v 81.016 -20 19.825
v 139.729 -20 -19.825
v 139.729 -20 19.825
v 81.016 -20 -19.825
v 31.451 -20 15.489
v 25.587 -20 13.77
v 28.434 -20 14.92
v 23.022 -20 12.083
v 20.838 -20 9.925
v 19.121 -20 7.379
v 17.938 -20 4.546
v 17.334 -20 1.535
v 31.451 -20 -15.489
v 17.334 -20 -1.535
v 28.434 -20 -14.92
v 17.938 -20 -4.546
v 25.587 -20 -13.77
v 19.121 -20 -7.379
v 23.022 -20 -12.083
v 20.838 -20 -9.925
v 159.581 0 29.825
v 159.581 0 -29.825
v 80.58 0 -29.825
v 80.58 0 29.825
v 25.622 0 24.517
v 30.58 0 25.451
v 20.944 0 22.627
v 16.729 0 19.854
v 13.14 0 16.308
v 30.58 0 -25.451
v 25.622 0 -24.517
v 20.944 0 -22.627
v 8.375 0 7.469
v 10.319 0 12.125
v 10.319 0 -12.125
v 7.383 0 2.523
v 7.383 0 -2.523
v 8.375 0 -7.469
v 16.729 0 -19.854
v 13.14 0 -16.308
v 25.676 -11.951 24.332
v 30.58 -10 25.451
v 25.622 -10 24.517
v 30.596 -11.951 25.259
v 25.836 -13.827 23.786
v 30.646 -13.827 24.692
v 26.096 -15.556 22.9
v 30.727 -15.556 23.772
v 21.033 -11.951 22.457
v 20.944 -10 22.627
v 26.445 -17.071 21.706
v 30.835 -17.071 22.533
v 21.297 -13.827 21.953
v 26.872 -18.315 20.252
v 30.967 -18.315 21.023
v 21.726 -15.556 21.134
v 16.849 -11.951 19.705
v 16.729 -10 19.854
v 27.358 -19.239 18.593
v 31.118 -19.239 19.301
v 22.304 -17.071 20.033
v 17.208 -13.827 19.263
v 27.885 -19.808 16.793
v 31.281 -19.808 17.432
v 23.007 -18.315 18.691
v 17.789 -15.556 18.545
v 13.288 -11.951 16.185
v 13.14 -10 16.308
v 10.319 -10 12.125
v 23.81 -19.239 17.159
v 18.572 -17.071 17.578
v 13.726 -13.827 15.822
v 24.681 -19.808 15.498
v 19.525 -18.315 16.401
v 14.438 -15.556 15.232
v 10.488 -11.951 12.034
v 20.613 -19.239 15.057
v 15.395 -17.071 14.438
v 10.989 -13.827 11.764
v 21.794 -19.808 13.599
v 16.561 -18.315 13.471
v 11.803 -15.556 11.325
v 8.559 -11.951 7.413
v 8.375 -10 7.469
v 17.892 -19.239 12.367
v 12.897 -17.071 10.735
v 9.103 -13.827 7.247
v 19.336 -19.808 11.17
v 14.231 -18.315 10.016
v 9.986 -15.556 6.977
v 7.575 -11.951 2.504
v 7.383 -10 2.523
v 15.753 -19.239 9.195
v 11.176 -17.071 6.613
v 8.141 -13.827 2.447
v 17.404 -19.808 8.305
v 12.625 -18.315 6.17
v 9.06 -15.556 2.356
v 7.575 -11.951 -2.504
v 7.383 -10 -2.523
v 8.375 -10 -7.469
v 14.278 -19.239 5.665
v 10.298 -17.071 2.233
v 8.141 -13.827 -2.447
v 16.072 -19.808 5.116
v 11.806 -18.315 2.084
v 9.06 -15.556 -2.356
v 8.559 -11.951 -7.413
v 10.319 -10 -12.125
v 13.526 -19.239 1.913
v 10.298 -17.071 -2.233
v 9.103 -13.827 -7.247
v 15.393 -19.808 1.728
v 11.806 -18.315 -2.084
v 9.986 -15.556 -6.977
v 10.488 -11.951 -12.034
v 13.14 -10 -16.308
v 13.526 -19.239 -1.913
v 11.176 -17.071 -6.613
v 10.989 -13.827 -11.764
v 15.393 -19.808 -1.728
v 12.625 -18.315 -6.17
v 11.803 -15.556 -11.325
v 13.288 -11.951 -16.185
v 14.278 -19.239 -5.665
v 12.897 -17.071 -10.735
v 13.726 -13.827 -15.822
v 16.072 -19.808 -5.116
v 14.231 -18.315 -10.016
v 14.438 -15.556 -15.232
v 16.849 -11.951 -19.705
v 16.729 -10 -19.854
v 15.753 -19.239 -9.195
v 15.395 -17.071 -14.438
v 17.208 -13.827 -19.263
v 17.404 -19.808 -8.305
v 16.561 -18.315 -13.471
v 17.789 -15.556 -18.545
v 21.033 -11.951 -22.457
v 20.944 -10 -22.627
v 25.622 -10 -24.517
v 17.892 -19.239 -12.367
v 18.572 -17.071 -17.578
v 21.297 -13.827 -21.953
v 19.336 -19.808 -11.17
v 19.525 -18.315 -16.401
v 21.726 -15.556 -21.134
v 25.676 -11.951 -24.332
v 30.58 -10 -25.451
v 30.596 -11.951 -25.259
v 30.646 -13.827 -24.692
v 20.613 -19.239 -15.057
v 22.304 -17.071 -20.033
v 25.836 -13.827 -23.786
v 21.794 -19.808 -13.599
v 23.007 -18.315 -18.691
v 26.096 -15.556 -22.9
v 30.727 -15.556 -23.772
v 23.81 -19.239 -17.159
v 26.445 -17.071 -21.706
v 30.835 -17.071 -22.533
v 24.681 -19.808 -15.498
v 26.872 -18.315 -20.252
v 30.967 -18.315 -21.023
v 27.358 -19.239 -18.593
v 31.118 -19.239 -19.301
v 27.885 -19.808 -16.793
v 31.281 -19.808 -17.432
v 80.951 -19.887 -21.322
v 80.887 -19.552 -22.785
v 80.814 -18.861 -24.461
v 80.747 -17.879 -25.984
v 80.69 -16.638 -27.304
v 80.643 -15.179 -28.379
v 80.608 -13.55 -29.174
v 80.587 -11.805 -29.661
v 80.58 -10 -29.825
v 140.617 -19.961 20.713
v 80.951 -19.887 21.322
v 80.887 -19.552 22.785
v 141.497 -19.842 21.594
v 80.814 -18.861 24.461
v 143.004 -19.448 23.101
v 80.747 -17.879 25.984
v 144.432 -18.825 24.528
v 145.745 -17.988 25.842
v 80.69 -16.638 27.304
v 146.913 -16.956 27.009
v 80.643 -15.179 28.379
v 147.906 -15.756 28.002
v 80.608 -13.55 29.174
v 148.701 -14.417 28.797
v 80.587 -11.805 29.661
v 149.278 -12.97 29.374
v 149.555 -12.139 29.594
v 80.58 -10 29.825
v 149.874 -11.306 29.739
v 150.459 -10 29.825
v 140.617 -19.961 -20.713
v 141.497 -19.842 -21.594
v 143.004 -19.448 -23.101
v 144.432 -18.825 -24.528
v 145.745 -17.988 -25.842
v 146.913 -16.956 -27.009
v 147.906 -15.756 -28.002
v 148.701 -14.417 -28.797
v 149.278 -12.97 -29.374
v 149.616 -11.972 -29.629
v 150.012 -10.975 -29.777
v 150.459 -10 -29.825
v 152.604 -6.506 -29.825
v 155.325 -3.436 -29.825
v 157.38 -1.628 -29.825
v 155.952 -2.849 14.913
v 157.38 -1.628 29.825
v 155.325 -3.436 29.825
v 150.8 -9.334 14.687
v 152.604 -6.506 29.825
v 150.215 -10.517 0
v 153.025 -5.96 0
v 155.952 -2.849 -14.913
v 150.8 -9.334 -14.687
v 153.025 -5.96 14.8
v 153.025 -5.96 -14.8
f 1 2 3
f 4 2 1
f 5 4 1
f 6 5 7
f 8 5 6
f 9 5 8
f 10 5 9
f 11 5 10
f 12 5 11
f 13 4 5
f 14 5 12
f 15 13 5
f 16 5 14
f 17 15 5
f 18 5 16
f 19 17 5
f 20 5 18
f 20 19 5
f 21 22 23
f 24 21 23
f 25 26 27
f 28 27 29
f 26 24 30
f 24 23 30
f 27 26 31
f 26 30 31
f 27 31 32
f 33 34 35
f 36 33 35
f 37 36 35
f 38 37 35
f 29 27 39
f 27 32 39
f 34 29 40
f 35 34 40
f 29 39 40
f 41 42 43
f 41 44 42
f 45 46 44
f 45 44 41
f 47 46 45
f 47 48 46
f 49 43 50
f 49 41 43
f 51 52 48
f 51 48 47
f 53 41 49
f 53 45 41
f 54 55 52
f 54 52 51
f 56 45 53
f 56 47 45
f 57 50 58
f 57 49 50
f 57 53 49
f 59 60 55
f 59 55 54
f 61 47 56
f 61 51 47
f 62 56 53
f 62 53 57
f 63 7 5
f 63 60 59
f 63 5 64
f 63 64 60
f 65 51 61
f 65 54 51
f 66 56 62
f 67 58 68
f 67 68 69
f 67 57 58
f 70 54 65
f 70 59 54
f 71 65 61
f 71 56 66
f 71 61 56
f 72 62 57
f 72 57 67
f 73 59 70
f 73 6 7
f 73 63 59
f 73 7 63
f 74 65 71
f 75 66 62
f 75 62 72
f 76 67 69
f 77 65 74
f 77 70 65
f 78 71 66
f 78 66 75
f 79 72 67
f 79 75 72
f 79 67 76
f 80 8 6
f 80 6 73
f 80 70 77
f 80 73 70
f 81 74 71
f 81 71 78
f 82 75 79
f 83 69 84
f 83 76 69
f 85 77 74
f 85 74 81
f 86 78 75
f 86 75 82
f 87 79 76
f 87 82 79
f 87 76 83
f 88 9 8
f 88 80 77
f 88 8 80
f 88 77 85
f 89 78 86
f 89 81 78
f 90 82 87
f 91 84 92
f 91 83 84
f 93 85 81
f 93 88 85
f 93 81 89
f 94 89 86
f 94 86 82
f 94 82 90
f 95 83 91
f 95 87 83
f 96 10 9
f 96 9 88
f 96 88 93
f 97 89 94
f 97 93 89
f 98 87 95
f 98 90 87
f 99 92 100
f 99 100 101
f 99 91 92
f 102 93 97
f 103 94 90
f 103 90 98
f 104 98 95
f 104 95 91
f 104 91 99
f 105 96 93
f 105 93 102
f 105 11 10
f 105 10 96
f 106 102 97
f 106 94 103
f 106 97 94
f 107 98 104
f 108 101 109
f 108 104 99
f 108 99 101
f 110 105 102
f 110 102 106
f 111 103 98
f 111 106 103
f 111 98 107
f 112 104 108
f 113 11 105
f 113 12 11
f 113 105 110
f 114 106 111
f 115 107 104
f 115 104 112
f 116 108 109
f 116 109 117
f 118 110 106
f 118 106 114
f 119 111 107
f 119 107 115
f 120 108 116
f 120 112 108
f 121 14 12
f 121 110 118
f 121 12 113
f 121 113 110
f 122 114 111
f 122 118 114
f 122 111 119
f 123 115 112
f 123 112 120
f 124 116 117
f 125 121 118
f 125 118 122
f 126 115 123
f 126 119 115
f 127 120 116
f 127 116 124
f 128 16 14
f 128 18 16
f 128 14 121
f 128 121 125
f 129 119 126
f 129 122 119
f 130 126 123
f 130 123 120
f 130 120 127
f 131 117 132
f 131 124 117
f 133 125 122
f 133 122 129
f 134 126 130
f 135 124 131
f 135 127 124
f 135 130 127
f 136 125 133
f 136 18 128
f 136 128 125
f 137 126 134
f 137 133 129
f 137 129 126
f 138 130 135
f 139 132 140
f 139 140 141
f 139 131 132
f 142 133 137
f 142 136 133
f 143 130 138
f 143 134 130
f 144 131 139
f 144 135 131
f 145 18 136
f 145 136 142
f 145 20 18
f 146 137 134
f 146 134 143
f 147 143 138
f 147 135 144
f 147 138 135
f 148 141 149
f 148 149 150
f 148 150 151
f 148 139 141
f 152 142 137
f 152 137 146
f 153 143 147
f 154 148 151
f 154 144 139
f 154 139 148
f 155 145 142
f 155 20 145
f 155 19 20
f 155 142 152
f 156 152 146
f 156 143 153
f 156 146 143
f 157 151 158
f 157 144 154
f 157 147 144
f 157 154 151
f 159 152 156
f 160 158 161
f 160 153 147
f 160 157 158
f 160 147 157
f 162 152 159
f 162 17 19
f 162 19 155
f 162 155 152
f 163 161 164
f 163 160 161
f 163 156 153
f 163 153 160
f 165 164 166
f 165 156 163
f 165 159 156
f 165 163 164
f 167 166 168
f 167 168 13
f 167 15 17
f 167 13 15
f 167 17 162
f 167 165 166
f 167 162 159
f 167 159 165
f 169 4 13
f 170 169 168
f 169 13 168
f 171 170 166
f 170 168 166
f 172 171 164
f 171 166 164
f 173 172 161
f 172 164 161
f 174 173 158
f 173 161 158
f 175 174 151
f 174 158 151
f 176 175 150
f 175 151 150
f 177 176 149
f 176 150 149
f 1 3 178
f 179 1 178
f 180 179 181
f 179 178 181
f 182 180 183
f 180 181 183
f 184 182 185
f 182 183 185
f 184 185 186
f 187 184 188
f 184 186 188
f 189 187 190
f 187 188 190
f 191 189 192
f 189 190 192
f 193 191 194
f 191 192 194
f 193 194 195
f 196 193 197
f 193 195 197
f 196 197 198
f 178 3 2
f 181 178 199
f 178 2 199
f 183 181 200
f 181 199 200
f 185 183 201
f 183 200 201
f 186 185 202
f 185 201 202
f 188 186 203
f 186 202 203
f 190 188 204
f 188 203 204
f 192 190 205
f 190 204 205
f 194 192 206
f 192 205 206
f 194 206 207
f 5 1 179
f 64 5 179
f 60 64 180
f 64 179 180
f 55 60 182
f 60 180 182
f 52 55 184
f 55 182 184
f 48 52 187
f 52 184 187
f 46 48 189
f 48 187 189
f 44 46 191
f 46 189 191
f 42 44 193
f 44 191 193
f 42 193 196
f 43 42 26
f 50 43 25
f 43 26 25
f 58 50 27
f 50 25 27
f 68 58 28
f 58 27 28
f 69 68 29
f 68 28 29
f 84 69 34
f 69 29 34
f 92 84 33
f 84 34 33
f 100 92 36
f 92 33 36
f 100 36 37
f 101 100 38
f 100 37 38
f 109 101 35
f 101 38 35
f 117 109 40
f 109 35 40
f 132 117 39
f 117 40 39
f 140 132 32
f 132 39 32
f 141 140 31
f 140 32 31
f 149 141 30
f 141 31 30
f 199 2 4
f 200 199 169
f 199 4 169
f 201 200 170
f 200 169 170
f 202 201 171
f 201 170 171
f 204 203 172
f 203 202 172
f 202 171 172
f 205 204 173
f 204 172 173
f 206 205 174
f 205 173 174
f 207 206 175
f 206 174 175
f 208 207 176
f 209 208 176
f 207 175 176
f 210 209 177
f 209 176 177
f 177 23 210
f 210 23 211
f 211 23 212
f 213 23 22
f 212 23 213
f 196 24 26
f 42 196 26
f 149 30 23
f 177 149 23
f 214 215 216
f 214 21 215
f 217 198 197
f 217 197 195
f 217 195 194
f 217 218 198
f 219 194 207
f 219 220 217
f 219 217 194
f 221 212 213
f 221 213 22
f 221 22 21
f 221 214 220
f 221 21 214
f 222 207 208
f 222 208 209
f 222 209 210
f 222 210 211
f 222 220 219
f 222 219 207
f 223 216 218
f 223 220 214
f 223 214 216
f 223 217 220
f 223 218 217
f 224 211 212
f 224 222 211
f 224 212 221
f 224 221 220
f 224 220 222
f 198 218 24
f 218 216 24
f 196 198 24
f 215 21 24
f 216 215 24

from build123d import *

# Parameters (mm, degrees)
EXTRUDE_1_DEPTH          = 20
CUT_EXTRUDE_1_DEPTH      = 168.622030081
CUT_EXTRUDE_1_DEPTH_BACK = 168.622030081
FILLET_1_R               = 10


with BuildPart() as part:
    # 草图3 → 凸台-拉伸1 (new body)
    with BuildSketch(Plane(origin=(0, 0, 0), x_dir=(1, 0, 0), z_dir=(0, 1, 0))):
        with BuildLine():
            Line((163.730296133, -29.825074964), (80.579718414, -29.825074964))
            Line((80.579718414, -29.825074964), (30.579718414, -25.450641788))
            ThreePointArc((30.579718414, -25.450641788), (7.258501946, 0), (30.579718414, 25.450641788))
            Line((30.579718414, 25.450641788), (80.579718414, 29.825074964))
            Line((80.579718414, 29.825074964), (163.730296133, 29.825074964))
            Line((163.730296133, 29.825074964), (163.730296133, -29.825074964))
        make_face()
    extrude(amount=-EXTRUDE_1_DEPTH)

    # 草图4 → 切除-拉伸1 (cut, two sides: drawn at the far end of the back side and taken through both)
    with BuildSketch(Plane.XY.offset(-CUT_EXTRUDE_1_DEPTH_BACK)):
        with BuildLine():
            Line((163.730296133, 0), (159.58071917, 0))
            add(Edge.make_bspline(
                [(159.58071917, 0), (148.122104631, -7.824360885), (148.302724928, -20)],
                knots=[0, 0, 0, 1, 1, 1], degree=2))
            Line((148.302724928, -20), (203.221653408, -20))
            Line((203.221653408, -20), (203.221653408, 0))
            Line((203.221653408, 0), (163.730296133, 0))
        make_face()
    extrude(amount=CUT_EXTRUDE_1_DEPTH + CUT_EXTRUDE_1_DEPTH_BACK, mode=Mode.SUBTRACT)

    # 圆角1
    # the kernel refuses this fillet: 10 mm, written as the material it takes off along each edge
    with BuildSketch(Plane(origin=(55.579718414, -20, -29.825074964), x_dir=(0, 0, 1), z_dir=(1, 0, 0))) as fillet_1_piece_1_section:
        with BuildLine():
            CenterArc((FILLET_1_R, -FILLET_1_R), FILLET_1_R, 90, 90)
            Line((0, -FILLET_1_R), (-FILLET_1_R * 0.02, -FILLET_1_R))
            Line((-FILLET_1_R * 0.02, -FILLET_1_R), (-FILLET_1_R * 0.02, FILLET_1_R * 0.02))
            Line((-FILLET_1_R * 0.02, FILLET_1_R * 0.02), (FILLET_1_R, FILLET_1_R * 0.02))
            Line((FILLET_1_R, FILLET_1_R * 0.02), (FILLET_1_R, 0))
        make_face()
    fillet_1_piece_1 = extrude(amount=117.723006514, mode=Mode.PRIVATE)
    fillet_1_piece_1 = split(fillet_1_piece_1, bisect_by=Plane(origin=(118.163125223, -17.857550266, -33.113196996), z_dir=(0.08715574274764791, 0, 0.9961946980917464)), keep=Keep.TOP, mode=Mode.PRIVATE)
    add(fillet_1_piece_1, mode=Mode.SUBTRACT)
    with BuildSketch(Plane(origin=(173.302724928, -20, 29.825074964), x_dir=(0, 1, 0), z_dir=(-1, 0, 0))) as fillet_1_piece_2_section:
        with BuildLine():
            CenterArc((FILLET_1_R, FILLET_1_R), FILLET_1_R, 180, 90)
            Line((0, FILLET_1_R), (-FILLET_1_R * 0.02, FILLET_1_R))
            Line((-FILLET_1_R * 0.02, FILLET_1_R), (-FILLET_1_R * 0.02, -FILLET_1_R * 0.02))
            Line((-FILLET_1_R * 0.02, -FILLET_1_R * 0.02), (FILLET_1_R, -FILLET_1_R * 0.02))
            Line((FILLET_1_R, -FILLET_1_R * 0.02), (FILLET_1_R, 0))
        make_face()
    fillet_1_piece_2 = extrude(amount=117.723006514, mode=Mode.PRIVATE)
    fillet_1_piece_2 = split(fillet_1_piece_2, bisect_by=Plane(origin=(118.163125223, -17.857550266, 33.113196996), z_dir=(0.08715574274764758, 0, -0.9961946980917465)), keep=Keep.TOP, mode=Mode.PRIVATE)
    add(fillet_1_piece_2, mode=Mode.SUBTRACT)
    with BuildSketch(Plane(origin=(105.484585867, -20, 32.003968533), x_dir=(0, 1, 0), z_dir=(-0.9961946980917465, 0, -0.08715574274764758))) as fillet_1_piece_3_section:
        with BuildLine():
            CenterArc((FILLET_1_R, FILLET_1_R), FILLET_1_R, 180, 90)
            Line((0, FILLET_1_R), (-FILLET_1_R * 0.02, FILLET_1_R))
            Line((-FILLET_1_R * 0.02, FILLET_1_R), (-FILLET_1_R * 0.02, -FILLET_1_R * 0.02))
            Line((-FILLET_1_R * 0.02, -FILLET_1_R * 0.02), (FILLET_1_R, -FILLET_1_R * 0.02))
            Line((FILLET_1_R, -FILLET_1_R * 0.02), (FILLET_1_R, 0))
        make_face()
    fillet_1_piece_3 = extrude(amount=75.190991877, mode=Mode.PRIVATE)
    fillet_1_piece_3 = split(fillet_1_piece_3, bisect_by=Plane(origin=(64.333848785, -17.936020538, 29.825074964), z_dir=(0, 0, -1)), keep=Keep.TOP, mode=Mode.PRIVATE)
    add(fillet_1_piece_3, mode=Mode.SUBTRACT)
    with BuildSketch(Plane(origin=(148.302724928, -20, 0), x_dir=(-1, 0, 0), z_dir=(0, 0, -1))) as fillet_1_piece_4:
        with BuildLine():
            CenterArc((8.573839583, 10), FILLET_1_R, 197.276402176, 72.723597824)
            Line((-0.974992369, 7.030183787), (-1.165969008, 6.970787462))
            ThreePointArc((-1.165969008, 6.970787462), (-0.405650645, 3.526203376), (-0.199977997, 0.002966586))
            Line((-0.199977997, 0.002966586), (0, -0.2))
            Line((0, -0.2), (8.573839583, -0.2))
            Line((8.573839583, -0.2), (8.573839583, 0))
        make_face()
    extrude(amount=29.825074964, mode=Mode.SUBTRACT)
    with BuildSketch(Plane(origin=(32.80636105, -20, 0), x_dir=(-0.08715574274764748, 0, 0.9961946980917464), z_dir=(0.9961946980917464, 0, 0.08715574274764748))) as fillet_1_piece_5:
        with BuildLine():
            CenterArc((25.547859105 - FILLET_1_R, -FILLET_1_R), FILLET_1_R, 0, 90)
            Line((25.547859105, -FILLET_1_R), (25.547859105 + FILLET_1_R * 0.02, -FILLET_1_R))
            Line((25.547859105 + FILLET_1_R * 0.02, -FILLET_1_R), (25.547859105 + FILLET_1_R * 0.02, FILLET_1_R * 0.02))
            Line((25.547859105 + FILLET_1_R * 0.02, FILLET_1_R * 0.02), (25.547859105 - FILLET_1_R, FILLET_1_R * 0.02))
            Line((25.547859105 - FILLET_1_R, FILLET_1_R * 0.02), (25.547859105 - FILLET_1_R, 0))
        make_face()
    revolve(axis=Axis((32.80636105, -20, 0), (0, -1, 0)), revolution_arc=170, mode=Mode.SUBTRACT)
    with BuildSketch(Plane(origin=(30.579718414, -20, -25.450641788), x_dir=(0.0871557427476479, 0, 0.9961946980917464), z_dir=(0.9961946980917464, 0, -0.08715574274764791))) as fillet_1_piece_6_section:
        with BuildLine():
            CenterArc((FILLET_1_R, -FILLET_1_R), FILLET_1_R, 90, 90)
            Line((0, -FILLET_1_R), (-FILLET_1_R * 0.02, -FILLET_1_R))
            Line((-FILLET_1_R * 0.02, -FILLET_1_R), (-FILLET_1_R * 0.02, FILLET_1_R * 0.02))
            Line((-FILLET_1_R * 0.02, FILLET_1_R * 0.02), (FILLET_1_R, FILLET_1_R * 0.02))
            Line((FILLET_1_R, FILLET_1_R * 0.02), (FILLET_1_R, 0))
        make_face()
    fillet_1_piece_6 = extrude(amount=75.190991877, mode=Mode.PRIVATE)
    fillet_1_piece_6 = split(fillet_1_piece_6, bisect_by=Plane(origin=(64.333848785, -17.936020538, -29.825074964), z_dir=(0, 0, 1)), keep=Keep.TOP, mode=Mode.PRIVATE)
    add(fillet_1_piece_6, mode=Mode.SUBTRACT)
    with BuildSketch(Plane(origin=(148.302724928, -20, 0), x_dir=(-1, 0, 0), z_dir=(0, 0, 1))) as fillet_1_piece_7:
        with BuildLine():
            CenterArc((8.573839583, -10), FILLET_1_R, 90, 72.723597824)
            Line((-0.974992369, -7.030183787), (-1.165969008, -6.970787462))
            ThreePointArc((-1.165969008, -6.970787462), (-0.405650645, -3.526203376), (-0.199977997, -0.002966586))
            Line((-0.199977997, -0.002966586), (0, 0.2))
            Line((0, 0.2), (8.573839583, 0.2))
            Line((8.573839583, 0.2), (8.573839583, 0))
        make_face()
    extrude(amount=29.825074964, mode=Mode.SUBTRACT)
    with BuildSketch(Plane(origin=(55.579718414, -20, -29.825074964), x_dir=(0, 0, 1), z_dir=(1, 0, 0))) as fillet_1_piece_8a_section:
        with BuildLine():
            CenterArc((FILLET_1_R, -FILLET_1_R), FILLET_1_R, 90, 90)
            Line((0, -FILLET_1_R), (-FILLET_1_R * 0.02, -FILLET_1_R))
            Line((-FILLET_1_R * 0.02, -FILLET_1_R), (-FILLET_1_R * 0.02, FILLET_1_R * 0.02))
            Line((-FILLET_1_R * 0.02, FILLET_1_R * 0.02), (FILLET_1_R, FILLET_1_R * 0.02))
            Line((FILLET_1_R, FILLET_1_R * 0.02), (FILLET_1_R, 0))
        make_face()
    fillet_1_piece_8a = extrude(amount=117.723006514, mode=Mode.PRIVATE)
    fillet_1_piece_8a = split(fillet_1_piece_8a, bisect_by=Plane(origin=(65.506587176, -16.325384108, -28.506346857), z_dir=(-0.08715574274764791, 0, -0.9961946980917464)), keep=Keep.TOP, mode=Mode.PRIVATE)
    with BuildSketch(Plane(origin=(30.579718414, -20, -25.450641788), x_dir=(0.0871557427476479, 0, 0.9961946980917464), z_dir=(0.9961946980917464, 0, -0.08715574274764791))) as fillet_1_piece_8b_section:
        with BuildLine():
            CenterArc((FILLET_1_R, -FILLET_1_R), FILLET_1_R, 90, 90)
            Line((0, -FILLET_1_R), (-FILLET_1_R * 0.02, -FILLET_1_R))
            Line((-FILLET_1_R * 0.02, -FILLET_1_R), (-FILLET_1_R * 0.02, FILLET_1_R * 0.02))
            Line((-FILLET_1_R * 0.02, FILLET_1_R * 0.02), (FILLET_1_R, FILLET_1_R * 0.02))
            Line((FILLET_1_R, FILLET_1_R * 0.02), (FILLET_1_R, 0))
        make_face()
    fillet_1_piece_8b = extrude(amount=75.190991877, mode=Mode.PRIVATE)
    fillet_1_piece_8b = split(fillet_1_piece_8b, bisect_by=Plane(origin=(95.710426565, -16.325384108, -29.825074964), z_dir=(0, 0, -1)), keep=Keep.TOP, mode=Mode.PRIVATE)
    fillet_1_piece_8 = fillet_1_piece_8a & fillet_1_piece_8b
    add(fillet_1_piece_8, mode=Mode.SUBTRACT)
    with BuildSketch(Plane(origin=(173.302724928, -20, 29.825074964), x_dir=(0, 1, 0), z_dir=(-1, 0, 0))) as fillet_1_piece_9a_section:
        with BuildLine():
            CenterArc((FILLET_1_R, FILLET_1_R), FILLET_1_R, 180, 90)
            Line((0, FILLET_1_R), (-FILLET_1_R * 0.02, FILLET_1_R))
            Line((-FILLET_1_R * 0.02, FILLET_1_R), (-FILLET_1_R * 0.02, -FILLET_1_R * 0.02))
            Line((-FILLET_1_R * 0.02, -FILLET_1_R * 0.02), (FILLET_1_R, -FILLET_1_R * 0.02))
            Line((FILLET_1_R, -FILLET_1_R * 0.02), (FILLET_1_R, 0))
        make_face()
    fillet_1_piece_9a = extrude(amount=117.723006514, mode=Mode.PRIVATE)
    fillet_1_piece_9a = split(fillet_1_piece_9a, bisect_by=Plane(origin=(65.506587176, -16.325384108, 28.506346857), z_dir=(-0.08715574274764758, 0, 0.9961946980917465)), keep=Keep.TOP, mode=Mode.PRIVATE)
    with BuildSketch(Plane(origin=(105.484585867, -20, 32.003968533), x_dir=(0, 1, 0), z_dir=(-0.9961946980917465, 0, -0.08715574274764758))) as fillet_1_piece_9b_section:
        with BuildLine():
            CenterArc((FILLET_1_R, FILLET_1_R), FILLET_1_R, 180, 90)
            Line((0, FILLET_1_R), (-FILLET_1_R * 0.02, FILLET_1_R))
            Line((-FILLET_1_R * 0.02, FILLET_1_R), (-FILLET_1_R * 0.02, -FILLET_1_R * 0.02))
            Line((-FILLET_1_R * 0.02, -FILLET_1_R * 0.02), (FILLET_1_R, -FILLET_1_R * 0.02))
            Line((FILLET_1_R, -FILLET_1_R * 0.02), (FILLET_1_R, 0))
        make_face()
    fillet_1_piece_9b = extrude(amount=75.190991877, mode=Mode.PRIVATE)
    fillet_1_piece_9b = split(fillet_1_piece_9b, bisect_by=Plane(origin=(95.710426565, -16.325384108, 29.825074964), z_dir=(0, 0, 1)), keep=Keep.TOP, mode=Mode.PRIVATE)
    fillet_1_piece_9 = fillet_1_piece_9a & fillet_1_piece_9b
    add(fillet_1_piece_9, mode=Mode.SUBTRACT)


solid = part.part
